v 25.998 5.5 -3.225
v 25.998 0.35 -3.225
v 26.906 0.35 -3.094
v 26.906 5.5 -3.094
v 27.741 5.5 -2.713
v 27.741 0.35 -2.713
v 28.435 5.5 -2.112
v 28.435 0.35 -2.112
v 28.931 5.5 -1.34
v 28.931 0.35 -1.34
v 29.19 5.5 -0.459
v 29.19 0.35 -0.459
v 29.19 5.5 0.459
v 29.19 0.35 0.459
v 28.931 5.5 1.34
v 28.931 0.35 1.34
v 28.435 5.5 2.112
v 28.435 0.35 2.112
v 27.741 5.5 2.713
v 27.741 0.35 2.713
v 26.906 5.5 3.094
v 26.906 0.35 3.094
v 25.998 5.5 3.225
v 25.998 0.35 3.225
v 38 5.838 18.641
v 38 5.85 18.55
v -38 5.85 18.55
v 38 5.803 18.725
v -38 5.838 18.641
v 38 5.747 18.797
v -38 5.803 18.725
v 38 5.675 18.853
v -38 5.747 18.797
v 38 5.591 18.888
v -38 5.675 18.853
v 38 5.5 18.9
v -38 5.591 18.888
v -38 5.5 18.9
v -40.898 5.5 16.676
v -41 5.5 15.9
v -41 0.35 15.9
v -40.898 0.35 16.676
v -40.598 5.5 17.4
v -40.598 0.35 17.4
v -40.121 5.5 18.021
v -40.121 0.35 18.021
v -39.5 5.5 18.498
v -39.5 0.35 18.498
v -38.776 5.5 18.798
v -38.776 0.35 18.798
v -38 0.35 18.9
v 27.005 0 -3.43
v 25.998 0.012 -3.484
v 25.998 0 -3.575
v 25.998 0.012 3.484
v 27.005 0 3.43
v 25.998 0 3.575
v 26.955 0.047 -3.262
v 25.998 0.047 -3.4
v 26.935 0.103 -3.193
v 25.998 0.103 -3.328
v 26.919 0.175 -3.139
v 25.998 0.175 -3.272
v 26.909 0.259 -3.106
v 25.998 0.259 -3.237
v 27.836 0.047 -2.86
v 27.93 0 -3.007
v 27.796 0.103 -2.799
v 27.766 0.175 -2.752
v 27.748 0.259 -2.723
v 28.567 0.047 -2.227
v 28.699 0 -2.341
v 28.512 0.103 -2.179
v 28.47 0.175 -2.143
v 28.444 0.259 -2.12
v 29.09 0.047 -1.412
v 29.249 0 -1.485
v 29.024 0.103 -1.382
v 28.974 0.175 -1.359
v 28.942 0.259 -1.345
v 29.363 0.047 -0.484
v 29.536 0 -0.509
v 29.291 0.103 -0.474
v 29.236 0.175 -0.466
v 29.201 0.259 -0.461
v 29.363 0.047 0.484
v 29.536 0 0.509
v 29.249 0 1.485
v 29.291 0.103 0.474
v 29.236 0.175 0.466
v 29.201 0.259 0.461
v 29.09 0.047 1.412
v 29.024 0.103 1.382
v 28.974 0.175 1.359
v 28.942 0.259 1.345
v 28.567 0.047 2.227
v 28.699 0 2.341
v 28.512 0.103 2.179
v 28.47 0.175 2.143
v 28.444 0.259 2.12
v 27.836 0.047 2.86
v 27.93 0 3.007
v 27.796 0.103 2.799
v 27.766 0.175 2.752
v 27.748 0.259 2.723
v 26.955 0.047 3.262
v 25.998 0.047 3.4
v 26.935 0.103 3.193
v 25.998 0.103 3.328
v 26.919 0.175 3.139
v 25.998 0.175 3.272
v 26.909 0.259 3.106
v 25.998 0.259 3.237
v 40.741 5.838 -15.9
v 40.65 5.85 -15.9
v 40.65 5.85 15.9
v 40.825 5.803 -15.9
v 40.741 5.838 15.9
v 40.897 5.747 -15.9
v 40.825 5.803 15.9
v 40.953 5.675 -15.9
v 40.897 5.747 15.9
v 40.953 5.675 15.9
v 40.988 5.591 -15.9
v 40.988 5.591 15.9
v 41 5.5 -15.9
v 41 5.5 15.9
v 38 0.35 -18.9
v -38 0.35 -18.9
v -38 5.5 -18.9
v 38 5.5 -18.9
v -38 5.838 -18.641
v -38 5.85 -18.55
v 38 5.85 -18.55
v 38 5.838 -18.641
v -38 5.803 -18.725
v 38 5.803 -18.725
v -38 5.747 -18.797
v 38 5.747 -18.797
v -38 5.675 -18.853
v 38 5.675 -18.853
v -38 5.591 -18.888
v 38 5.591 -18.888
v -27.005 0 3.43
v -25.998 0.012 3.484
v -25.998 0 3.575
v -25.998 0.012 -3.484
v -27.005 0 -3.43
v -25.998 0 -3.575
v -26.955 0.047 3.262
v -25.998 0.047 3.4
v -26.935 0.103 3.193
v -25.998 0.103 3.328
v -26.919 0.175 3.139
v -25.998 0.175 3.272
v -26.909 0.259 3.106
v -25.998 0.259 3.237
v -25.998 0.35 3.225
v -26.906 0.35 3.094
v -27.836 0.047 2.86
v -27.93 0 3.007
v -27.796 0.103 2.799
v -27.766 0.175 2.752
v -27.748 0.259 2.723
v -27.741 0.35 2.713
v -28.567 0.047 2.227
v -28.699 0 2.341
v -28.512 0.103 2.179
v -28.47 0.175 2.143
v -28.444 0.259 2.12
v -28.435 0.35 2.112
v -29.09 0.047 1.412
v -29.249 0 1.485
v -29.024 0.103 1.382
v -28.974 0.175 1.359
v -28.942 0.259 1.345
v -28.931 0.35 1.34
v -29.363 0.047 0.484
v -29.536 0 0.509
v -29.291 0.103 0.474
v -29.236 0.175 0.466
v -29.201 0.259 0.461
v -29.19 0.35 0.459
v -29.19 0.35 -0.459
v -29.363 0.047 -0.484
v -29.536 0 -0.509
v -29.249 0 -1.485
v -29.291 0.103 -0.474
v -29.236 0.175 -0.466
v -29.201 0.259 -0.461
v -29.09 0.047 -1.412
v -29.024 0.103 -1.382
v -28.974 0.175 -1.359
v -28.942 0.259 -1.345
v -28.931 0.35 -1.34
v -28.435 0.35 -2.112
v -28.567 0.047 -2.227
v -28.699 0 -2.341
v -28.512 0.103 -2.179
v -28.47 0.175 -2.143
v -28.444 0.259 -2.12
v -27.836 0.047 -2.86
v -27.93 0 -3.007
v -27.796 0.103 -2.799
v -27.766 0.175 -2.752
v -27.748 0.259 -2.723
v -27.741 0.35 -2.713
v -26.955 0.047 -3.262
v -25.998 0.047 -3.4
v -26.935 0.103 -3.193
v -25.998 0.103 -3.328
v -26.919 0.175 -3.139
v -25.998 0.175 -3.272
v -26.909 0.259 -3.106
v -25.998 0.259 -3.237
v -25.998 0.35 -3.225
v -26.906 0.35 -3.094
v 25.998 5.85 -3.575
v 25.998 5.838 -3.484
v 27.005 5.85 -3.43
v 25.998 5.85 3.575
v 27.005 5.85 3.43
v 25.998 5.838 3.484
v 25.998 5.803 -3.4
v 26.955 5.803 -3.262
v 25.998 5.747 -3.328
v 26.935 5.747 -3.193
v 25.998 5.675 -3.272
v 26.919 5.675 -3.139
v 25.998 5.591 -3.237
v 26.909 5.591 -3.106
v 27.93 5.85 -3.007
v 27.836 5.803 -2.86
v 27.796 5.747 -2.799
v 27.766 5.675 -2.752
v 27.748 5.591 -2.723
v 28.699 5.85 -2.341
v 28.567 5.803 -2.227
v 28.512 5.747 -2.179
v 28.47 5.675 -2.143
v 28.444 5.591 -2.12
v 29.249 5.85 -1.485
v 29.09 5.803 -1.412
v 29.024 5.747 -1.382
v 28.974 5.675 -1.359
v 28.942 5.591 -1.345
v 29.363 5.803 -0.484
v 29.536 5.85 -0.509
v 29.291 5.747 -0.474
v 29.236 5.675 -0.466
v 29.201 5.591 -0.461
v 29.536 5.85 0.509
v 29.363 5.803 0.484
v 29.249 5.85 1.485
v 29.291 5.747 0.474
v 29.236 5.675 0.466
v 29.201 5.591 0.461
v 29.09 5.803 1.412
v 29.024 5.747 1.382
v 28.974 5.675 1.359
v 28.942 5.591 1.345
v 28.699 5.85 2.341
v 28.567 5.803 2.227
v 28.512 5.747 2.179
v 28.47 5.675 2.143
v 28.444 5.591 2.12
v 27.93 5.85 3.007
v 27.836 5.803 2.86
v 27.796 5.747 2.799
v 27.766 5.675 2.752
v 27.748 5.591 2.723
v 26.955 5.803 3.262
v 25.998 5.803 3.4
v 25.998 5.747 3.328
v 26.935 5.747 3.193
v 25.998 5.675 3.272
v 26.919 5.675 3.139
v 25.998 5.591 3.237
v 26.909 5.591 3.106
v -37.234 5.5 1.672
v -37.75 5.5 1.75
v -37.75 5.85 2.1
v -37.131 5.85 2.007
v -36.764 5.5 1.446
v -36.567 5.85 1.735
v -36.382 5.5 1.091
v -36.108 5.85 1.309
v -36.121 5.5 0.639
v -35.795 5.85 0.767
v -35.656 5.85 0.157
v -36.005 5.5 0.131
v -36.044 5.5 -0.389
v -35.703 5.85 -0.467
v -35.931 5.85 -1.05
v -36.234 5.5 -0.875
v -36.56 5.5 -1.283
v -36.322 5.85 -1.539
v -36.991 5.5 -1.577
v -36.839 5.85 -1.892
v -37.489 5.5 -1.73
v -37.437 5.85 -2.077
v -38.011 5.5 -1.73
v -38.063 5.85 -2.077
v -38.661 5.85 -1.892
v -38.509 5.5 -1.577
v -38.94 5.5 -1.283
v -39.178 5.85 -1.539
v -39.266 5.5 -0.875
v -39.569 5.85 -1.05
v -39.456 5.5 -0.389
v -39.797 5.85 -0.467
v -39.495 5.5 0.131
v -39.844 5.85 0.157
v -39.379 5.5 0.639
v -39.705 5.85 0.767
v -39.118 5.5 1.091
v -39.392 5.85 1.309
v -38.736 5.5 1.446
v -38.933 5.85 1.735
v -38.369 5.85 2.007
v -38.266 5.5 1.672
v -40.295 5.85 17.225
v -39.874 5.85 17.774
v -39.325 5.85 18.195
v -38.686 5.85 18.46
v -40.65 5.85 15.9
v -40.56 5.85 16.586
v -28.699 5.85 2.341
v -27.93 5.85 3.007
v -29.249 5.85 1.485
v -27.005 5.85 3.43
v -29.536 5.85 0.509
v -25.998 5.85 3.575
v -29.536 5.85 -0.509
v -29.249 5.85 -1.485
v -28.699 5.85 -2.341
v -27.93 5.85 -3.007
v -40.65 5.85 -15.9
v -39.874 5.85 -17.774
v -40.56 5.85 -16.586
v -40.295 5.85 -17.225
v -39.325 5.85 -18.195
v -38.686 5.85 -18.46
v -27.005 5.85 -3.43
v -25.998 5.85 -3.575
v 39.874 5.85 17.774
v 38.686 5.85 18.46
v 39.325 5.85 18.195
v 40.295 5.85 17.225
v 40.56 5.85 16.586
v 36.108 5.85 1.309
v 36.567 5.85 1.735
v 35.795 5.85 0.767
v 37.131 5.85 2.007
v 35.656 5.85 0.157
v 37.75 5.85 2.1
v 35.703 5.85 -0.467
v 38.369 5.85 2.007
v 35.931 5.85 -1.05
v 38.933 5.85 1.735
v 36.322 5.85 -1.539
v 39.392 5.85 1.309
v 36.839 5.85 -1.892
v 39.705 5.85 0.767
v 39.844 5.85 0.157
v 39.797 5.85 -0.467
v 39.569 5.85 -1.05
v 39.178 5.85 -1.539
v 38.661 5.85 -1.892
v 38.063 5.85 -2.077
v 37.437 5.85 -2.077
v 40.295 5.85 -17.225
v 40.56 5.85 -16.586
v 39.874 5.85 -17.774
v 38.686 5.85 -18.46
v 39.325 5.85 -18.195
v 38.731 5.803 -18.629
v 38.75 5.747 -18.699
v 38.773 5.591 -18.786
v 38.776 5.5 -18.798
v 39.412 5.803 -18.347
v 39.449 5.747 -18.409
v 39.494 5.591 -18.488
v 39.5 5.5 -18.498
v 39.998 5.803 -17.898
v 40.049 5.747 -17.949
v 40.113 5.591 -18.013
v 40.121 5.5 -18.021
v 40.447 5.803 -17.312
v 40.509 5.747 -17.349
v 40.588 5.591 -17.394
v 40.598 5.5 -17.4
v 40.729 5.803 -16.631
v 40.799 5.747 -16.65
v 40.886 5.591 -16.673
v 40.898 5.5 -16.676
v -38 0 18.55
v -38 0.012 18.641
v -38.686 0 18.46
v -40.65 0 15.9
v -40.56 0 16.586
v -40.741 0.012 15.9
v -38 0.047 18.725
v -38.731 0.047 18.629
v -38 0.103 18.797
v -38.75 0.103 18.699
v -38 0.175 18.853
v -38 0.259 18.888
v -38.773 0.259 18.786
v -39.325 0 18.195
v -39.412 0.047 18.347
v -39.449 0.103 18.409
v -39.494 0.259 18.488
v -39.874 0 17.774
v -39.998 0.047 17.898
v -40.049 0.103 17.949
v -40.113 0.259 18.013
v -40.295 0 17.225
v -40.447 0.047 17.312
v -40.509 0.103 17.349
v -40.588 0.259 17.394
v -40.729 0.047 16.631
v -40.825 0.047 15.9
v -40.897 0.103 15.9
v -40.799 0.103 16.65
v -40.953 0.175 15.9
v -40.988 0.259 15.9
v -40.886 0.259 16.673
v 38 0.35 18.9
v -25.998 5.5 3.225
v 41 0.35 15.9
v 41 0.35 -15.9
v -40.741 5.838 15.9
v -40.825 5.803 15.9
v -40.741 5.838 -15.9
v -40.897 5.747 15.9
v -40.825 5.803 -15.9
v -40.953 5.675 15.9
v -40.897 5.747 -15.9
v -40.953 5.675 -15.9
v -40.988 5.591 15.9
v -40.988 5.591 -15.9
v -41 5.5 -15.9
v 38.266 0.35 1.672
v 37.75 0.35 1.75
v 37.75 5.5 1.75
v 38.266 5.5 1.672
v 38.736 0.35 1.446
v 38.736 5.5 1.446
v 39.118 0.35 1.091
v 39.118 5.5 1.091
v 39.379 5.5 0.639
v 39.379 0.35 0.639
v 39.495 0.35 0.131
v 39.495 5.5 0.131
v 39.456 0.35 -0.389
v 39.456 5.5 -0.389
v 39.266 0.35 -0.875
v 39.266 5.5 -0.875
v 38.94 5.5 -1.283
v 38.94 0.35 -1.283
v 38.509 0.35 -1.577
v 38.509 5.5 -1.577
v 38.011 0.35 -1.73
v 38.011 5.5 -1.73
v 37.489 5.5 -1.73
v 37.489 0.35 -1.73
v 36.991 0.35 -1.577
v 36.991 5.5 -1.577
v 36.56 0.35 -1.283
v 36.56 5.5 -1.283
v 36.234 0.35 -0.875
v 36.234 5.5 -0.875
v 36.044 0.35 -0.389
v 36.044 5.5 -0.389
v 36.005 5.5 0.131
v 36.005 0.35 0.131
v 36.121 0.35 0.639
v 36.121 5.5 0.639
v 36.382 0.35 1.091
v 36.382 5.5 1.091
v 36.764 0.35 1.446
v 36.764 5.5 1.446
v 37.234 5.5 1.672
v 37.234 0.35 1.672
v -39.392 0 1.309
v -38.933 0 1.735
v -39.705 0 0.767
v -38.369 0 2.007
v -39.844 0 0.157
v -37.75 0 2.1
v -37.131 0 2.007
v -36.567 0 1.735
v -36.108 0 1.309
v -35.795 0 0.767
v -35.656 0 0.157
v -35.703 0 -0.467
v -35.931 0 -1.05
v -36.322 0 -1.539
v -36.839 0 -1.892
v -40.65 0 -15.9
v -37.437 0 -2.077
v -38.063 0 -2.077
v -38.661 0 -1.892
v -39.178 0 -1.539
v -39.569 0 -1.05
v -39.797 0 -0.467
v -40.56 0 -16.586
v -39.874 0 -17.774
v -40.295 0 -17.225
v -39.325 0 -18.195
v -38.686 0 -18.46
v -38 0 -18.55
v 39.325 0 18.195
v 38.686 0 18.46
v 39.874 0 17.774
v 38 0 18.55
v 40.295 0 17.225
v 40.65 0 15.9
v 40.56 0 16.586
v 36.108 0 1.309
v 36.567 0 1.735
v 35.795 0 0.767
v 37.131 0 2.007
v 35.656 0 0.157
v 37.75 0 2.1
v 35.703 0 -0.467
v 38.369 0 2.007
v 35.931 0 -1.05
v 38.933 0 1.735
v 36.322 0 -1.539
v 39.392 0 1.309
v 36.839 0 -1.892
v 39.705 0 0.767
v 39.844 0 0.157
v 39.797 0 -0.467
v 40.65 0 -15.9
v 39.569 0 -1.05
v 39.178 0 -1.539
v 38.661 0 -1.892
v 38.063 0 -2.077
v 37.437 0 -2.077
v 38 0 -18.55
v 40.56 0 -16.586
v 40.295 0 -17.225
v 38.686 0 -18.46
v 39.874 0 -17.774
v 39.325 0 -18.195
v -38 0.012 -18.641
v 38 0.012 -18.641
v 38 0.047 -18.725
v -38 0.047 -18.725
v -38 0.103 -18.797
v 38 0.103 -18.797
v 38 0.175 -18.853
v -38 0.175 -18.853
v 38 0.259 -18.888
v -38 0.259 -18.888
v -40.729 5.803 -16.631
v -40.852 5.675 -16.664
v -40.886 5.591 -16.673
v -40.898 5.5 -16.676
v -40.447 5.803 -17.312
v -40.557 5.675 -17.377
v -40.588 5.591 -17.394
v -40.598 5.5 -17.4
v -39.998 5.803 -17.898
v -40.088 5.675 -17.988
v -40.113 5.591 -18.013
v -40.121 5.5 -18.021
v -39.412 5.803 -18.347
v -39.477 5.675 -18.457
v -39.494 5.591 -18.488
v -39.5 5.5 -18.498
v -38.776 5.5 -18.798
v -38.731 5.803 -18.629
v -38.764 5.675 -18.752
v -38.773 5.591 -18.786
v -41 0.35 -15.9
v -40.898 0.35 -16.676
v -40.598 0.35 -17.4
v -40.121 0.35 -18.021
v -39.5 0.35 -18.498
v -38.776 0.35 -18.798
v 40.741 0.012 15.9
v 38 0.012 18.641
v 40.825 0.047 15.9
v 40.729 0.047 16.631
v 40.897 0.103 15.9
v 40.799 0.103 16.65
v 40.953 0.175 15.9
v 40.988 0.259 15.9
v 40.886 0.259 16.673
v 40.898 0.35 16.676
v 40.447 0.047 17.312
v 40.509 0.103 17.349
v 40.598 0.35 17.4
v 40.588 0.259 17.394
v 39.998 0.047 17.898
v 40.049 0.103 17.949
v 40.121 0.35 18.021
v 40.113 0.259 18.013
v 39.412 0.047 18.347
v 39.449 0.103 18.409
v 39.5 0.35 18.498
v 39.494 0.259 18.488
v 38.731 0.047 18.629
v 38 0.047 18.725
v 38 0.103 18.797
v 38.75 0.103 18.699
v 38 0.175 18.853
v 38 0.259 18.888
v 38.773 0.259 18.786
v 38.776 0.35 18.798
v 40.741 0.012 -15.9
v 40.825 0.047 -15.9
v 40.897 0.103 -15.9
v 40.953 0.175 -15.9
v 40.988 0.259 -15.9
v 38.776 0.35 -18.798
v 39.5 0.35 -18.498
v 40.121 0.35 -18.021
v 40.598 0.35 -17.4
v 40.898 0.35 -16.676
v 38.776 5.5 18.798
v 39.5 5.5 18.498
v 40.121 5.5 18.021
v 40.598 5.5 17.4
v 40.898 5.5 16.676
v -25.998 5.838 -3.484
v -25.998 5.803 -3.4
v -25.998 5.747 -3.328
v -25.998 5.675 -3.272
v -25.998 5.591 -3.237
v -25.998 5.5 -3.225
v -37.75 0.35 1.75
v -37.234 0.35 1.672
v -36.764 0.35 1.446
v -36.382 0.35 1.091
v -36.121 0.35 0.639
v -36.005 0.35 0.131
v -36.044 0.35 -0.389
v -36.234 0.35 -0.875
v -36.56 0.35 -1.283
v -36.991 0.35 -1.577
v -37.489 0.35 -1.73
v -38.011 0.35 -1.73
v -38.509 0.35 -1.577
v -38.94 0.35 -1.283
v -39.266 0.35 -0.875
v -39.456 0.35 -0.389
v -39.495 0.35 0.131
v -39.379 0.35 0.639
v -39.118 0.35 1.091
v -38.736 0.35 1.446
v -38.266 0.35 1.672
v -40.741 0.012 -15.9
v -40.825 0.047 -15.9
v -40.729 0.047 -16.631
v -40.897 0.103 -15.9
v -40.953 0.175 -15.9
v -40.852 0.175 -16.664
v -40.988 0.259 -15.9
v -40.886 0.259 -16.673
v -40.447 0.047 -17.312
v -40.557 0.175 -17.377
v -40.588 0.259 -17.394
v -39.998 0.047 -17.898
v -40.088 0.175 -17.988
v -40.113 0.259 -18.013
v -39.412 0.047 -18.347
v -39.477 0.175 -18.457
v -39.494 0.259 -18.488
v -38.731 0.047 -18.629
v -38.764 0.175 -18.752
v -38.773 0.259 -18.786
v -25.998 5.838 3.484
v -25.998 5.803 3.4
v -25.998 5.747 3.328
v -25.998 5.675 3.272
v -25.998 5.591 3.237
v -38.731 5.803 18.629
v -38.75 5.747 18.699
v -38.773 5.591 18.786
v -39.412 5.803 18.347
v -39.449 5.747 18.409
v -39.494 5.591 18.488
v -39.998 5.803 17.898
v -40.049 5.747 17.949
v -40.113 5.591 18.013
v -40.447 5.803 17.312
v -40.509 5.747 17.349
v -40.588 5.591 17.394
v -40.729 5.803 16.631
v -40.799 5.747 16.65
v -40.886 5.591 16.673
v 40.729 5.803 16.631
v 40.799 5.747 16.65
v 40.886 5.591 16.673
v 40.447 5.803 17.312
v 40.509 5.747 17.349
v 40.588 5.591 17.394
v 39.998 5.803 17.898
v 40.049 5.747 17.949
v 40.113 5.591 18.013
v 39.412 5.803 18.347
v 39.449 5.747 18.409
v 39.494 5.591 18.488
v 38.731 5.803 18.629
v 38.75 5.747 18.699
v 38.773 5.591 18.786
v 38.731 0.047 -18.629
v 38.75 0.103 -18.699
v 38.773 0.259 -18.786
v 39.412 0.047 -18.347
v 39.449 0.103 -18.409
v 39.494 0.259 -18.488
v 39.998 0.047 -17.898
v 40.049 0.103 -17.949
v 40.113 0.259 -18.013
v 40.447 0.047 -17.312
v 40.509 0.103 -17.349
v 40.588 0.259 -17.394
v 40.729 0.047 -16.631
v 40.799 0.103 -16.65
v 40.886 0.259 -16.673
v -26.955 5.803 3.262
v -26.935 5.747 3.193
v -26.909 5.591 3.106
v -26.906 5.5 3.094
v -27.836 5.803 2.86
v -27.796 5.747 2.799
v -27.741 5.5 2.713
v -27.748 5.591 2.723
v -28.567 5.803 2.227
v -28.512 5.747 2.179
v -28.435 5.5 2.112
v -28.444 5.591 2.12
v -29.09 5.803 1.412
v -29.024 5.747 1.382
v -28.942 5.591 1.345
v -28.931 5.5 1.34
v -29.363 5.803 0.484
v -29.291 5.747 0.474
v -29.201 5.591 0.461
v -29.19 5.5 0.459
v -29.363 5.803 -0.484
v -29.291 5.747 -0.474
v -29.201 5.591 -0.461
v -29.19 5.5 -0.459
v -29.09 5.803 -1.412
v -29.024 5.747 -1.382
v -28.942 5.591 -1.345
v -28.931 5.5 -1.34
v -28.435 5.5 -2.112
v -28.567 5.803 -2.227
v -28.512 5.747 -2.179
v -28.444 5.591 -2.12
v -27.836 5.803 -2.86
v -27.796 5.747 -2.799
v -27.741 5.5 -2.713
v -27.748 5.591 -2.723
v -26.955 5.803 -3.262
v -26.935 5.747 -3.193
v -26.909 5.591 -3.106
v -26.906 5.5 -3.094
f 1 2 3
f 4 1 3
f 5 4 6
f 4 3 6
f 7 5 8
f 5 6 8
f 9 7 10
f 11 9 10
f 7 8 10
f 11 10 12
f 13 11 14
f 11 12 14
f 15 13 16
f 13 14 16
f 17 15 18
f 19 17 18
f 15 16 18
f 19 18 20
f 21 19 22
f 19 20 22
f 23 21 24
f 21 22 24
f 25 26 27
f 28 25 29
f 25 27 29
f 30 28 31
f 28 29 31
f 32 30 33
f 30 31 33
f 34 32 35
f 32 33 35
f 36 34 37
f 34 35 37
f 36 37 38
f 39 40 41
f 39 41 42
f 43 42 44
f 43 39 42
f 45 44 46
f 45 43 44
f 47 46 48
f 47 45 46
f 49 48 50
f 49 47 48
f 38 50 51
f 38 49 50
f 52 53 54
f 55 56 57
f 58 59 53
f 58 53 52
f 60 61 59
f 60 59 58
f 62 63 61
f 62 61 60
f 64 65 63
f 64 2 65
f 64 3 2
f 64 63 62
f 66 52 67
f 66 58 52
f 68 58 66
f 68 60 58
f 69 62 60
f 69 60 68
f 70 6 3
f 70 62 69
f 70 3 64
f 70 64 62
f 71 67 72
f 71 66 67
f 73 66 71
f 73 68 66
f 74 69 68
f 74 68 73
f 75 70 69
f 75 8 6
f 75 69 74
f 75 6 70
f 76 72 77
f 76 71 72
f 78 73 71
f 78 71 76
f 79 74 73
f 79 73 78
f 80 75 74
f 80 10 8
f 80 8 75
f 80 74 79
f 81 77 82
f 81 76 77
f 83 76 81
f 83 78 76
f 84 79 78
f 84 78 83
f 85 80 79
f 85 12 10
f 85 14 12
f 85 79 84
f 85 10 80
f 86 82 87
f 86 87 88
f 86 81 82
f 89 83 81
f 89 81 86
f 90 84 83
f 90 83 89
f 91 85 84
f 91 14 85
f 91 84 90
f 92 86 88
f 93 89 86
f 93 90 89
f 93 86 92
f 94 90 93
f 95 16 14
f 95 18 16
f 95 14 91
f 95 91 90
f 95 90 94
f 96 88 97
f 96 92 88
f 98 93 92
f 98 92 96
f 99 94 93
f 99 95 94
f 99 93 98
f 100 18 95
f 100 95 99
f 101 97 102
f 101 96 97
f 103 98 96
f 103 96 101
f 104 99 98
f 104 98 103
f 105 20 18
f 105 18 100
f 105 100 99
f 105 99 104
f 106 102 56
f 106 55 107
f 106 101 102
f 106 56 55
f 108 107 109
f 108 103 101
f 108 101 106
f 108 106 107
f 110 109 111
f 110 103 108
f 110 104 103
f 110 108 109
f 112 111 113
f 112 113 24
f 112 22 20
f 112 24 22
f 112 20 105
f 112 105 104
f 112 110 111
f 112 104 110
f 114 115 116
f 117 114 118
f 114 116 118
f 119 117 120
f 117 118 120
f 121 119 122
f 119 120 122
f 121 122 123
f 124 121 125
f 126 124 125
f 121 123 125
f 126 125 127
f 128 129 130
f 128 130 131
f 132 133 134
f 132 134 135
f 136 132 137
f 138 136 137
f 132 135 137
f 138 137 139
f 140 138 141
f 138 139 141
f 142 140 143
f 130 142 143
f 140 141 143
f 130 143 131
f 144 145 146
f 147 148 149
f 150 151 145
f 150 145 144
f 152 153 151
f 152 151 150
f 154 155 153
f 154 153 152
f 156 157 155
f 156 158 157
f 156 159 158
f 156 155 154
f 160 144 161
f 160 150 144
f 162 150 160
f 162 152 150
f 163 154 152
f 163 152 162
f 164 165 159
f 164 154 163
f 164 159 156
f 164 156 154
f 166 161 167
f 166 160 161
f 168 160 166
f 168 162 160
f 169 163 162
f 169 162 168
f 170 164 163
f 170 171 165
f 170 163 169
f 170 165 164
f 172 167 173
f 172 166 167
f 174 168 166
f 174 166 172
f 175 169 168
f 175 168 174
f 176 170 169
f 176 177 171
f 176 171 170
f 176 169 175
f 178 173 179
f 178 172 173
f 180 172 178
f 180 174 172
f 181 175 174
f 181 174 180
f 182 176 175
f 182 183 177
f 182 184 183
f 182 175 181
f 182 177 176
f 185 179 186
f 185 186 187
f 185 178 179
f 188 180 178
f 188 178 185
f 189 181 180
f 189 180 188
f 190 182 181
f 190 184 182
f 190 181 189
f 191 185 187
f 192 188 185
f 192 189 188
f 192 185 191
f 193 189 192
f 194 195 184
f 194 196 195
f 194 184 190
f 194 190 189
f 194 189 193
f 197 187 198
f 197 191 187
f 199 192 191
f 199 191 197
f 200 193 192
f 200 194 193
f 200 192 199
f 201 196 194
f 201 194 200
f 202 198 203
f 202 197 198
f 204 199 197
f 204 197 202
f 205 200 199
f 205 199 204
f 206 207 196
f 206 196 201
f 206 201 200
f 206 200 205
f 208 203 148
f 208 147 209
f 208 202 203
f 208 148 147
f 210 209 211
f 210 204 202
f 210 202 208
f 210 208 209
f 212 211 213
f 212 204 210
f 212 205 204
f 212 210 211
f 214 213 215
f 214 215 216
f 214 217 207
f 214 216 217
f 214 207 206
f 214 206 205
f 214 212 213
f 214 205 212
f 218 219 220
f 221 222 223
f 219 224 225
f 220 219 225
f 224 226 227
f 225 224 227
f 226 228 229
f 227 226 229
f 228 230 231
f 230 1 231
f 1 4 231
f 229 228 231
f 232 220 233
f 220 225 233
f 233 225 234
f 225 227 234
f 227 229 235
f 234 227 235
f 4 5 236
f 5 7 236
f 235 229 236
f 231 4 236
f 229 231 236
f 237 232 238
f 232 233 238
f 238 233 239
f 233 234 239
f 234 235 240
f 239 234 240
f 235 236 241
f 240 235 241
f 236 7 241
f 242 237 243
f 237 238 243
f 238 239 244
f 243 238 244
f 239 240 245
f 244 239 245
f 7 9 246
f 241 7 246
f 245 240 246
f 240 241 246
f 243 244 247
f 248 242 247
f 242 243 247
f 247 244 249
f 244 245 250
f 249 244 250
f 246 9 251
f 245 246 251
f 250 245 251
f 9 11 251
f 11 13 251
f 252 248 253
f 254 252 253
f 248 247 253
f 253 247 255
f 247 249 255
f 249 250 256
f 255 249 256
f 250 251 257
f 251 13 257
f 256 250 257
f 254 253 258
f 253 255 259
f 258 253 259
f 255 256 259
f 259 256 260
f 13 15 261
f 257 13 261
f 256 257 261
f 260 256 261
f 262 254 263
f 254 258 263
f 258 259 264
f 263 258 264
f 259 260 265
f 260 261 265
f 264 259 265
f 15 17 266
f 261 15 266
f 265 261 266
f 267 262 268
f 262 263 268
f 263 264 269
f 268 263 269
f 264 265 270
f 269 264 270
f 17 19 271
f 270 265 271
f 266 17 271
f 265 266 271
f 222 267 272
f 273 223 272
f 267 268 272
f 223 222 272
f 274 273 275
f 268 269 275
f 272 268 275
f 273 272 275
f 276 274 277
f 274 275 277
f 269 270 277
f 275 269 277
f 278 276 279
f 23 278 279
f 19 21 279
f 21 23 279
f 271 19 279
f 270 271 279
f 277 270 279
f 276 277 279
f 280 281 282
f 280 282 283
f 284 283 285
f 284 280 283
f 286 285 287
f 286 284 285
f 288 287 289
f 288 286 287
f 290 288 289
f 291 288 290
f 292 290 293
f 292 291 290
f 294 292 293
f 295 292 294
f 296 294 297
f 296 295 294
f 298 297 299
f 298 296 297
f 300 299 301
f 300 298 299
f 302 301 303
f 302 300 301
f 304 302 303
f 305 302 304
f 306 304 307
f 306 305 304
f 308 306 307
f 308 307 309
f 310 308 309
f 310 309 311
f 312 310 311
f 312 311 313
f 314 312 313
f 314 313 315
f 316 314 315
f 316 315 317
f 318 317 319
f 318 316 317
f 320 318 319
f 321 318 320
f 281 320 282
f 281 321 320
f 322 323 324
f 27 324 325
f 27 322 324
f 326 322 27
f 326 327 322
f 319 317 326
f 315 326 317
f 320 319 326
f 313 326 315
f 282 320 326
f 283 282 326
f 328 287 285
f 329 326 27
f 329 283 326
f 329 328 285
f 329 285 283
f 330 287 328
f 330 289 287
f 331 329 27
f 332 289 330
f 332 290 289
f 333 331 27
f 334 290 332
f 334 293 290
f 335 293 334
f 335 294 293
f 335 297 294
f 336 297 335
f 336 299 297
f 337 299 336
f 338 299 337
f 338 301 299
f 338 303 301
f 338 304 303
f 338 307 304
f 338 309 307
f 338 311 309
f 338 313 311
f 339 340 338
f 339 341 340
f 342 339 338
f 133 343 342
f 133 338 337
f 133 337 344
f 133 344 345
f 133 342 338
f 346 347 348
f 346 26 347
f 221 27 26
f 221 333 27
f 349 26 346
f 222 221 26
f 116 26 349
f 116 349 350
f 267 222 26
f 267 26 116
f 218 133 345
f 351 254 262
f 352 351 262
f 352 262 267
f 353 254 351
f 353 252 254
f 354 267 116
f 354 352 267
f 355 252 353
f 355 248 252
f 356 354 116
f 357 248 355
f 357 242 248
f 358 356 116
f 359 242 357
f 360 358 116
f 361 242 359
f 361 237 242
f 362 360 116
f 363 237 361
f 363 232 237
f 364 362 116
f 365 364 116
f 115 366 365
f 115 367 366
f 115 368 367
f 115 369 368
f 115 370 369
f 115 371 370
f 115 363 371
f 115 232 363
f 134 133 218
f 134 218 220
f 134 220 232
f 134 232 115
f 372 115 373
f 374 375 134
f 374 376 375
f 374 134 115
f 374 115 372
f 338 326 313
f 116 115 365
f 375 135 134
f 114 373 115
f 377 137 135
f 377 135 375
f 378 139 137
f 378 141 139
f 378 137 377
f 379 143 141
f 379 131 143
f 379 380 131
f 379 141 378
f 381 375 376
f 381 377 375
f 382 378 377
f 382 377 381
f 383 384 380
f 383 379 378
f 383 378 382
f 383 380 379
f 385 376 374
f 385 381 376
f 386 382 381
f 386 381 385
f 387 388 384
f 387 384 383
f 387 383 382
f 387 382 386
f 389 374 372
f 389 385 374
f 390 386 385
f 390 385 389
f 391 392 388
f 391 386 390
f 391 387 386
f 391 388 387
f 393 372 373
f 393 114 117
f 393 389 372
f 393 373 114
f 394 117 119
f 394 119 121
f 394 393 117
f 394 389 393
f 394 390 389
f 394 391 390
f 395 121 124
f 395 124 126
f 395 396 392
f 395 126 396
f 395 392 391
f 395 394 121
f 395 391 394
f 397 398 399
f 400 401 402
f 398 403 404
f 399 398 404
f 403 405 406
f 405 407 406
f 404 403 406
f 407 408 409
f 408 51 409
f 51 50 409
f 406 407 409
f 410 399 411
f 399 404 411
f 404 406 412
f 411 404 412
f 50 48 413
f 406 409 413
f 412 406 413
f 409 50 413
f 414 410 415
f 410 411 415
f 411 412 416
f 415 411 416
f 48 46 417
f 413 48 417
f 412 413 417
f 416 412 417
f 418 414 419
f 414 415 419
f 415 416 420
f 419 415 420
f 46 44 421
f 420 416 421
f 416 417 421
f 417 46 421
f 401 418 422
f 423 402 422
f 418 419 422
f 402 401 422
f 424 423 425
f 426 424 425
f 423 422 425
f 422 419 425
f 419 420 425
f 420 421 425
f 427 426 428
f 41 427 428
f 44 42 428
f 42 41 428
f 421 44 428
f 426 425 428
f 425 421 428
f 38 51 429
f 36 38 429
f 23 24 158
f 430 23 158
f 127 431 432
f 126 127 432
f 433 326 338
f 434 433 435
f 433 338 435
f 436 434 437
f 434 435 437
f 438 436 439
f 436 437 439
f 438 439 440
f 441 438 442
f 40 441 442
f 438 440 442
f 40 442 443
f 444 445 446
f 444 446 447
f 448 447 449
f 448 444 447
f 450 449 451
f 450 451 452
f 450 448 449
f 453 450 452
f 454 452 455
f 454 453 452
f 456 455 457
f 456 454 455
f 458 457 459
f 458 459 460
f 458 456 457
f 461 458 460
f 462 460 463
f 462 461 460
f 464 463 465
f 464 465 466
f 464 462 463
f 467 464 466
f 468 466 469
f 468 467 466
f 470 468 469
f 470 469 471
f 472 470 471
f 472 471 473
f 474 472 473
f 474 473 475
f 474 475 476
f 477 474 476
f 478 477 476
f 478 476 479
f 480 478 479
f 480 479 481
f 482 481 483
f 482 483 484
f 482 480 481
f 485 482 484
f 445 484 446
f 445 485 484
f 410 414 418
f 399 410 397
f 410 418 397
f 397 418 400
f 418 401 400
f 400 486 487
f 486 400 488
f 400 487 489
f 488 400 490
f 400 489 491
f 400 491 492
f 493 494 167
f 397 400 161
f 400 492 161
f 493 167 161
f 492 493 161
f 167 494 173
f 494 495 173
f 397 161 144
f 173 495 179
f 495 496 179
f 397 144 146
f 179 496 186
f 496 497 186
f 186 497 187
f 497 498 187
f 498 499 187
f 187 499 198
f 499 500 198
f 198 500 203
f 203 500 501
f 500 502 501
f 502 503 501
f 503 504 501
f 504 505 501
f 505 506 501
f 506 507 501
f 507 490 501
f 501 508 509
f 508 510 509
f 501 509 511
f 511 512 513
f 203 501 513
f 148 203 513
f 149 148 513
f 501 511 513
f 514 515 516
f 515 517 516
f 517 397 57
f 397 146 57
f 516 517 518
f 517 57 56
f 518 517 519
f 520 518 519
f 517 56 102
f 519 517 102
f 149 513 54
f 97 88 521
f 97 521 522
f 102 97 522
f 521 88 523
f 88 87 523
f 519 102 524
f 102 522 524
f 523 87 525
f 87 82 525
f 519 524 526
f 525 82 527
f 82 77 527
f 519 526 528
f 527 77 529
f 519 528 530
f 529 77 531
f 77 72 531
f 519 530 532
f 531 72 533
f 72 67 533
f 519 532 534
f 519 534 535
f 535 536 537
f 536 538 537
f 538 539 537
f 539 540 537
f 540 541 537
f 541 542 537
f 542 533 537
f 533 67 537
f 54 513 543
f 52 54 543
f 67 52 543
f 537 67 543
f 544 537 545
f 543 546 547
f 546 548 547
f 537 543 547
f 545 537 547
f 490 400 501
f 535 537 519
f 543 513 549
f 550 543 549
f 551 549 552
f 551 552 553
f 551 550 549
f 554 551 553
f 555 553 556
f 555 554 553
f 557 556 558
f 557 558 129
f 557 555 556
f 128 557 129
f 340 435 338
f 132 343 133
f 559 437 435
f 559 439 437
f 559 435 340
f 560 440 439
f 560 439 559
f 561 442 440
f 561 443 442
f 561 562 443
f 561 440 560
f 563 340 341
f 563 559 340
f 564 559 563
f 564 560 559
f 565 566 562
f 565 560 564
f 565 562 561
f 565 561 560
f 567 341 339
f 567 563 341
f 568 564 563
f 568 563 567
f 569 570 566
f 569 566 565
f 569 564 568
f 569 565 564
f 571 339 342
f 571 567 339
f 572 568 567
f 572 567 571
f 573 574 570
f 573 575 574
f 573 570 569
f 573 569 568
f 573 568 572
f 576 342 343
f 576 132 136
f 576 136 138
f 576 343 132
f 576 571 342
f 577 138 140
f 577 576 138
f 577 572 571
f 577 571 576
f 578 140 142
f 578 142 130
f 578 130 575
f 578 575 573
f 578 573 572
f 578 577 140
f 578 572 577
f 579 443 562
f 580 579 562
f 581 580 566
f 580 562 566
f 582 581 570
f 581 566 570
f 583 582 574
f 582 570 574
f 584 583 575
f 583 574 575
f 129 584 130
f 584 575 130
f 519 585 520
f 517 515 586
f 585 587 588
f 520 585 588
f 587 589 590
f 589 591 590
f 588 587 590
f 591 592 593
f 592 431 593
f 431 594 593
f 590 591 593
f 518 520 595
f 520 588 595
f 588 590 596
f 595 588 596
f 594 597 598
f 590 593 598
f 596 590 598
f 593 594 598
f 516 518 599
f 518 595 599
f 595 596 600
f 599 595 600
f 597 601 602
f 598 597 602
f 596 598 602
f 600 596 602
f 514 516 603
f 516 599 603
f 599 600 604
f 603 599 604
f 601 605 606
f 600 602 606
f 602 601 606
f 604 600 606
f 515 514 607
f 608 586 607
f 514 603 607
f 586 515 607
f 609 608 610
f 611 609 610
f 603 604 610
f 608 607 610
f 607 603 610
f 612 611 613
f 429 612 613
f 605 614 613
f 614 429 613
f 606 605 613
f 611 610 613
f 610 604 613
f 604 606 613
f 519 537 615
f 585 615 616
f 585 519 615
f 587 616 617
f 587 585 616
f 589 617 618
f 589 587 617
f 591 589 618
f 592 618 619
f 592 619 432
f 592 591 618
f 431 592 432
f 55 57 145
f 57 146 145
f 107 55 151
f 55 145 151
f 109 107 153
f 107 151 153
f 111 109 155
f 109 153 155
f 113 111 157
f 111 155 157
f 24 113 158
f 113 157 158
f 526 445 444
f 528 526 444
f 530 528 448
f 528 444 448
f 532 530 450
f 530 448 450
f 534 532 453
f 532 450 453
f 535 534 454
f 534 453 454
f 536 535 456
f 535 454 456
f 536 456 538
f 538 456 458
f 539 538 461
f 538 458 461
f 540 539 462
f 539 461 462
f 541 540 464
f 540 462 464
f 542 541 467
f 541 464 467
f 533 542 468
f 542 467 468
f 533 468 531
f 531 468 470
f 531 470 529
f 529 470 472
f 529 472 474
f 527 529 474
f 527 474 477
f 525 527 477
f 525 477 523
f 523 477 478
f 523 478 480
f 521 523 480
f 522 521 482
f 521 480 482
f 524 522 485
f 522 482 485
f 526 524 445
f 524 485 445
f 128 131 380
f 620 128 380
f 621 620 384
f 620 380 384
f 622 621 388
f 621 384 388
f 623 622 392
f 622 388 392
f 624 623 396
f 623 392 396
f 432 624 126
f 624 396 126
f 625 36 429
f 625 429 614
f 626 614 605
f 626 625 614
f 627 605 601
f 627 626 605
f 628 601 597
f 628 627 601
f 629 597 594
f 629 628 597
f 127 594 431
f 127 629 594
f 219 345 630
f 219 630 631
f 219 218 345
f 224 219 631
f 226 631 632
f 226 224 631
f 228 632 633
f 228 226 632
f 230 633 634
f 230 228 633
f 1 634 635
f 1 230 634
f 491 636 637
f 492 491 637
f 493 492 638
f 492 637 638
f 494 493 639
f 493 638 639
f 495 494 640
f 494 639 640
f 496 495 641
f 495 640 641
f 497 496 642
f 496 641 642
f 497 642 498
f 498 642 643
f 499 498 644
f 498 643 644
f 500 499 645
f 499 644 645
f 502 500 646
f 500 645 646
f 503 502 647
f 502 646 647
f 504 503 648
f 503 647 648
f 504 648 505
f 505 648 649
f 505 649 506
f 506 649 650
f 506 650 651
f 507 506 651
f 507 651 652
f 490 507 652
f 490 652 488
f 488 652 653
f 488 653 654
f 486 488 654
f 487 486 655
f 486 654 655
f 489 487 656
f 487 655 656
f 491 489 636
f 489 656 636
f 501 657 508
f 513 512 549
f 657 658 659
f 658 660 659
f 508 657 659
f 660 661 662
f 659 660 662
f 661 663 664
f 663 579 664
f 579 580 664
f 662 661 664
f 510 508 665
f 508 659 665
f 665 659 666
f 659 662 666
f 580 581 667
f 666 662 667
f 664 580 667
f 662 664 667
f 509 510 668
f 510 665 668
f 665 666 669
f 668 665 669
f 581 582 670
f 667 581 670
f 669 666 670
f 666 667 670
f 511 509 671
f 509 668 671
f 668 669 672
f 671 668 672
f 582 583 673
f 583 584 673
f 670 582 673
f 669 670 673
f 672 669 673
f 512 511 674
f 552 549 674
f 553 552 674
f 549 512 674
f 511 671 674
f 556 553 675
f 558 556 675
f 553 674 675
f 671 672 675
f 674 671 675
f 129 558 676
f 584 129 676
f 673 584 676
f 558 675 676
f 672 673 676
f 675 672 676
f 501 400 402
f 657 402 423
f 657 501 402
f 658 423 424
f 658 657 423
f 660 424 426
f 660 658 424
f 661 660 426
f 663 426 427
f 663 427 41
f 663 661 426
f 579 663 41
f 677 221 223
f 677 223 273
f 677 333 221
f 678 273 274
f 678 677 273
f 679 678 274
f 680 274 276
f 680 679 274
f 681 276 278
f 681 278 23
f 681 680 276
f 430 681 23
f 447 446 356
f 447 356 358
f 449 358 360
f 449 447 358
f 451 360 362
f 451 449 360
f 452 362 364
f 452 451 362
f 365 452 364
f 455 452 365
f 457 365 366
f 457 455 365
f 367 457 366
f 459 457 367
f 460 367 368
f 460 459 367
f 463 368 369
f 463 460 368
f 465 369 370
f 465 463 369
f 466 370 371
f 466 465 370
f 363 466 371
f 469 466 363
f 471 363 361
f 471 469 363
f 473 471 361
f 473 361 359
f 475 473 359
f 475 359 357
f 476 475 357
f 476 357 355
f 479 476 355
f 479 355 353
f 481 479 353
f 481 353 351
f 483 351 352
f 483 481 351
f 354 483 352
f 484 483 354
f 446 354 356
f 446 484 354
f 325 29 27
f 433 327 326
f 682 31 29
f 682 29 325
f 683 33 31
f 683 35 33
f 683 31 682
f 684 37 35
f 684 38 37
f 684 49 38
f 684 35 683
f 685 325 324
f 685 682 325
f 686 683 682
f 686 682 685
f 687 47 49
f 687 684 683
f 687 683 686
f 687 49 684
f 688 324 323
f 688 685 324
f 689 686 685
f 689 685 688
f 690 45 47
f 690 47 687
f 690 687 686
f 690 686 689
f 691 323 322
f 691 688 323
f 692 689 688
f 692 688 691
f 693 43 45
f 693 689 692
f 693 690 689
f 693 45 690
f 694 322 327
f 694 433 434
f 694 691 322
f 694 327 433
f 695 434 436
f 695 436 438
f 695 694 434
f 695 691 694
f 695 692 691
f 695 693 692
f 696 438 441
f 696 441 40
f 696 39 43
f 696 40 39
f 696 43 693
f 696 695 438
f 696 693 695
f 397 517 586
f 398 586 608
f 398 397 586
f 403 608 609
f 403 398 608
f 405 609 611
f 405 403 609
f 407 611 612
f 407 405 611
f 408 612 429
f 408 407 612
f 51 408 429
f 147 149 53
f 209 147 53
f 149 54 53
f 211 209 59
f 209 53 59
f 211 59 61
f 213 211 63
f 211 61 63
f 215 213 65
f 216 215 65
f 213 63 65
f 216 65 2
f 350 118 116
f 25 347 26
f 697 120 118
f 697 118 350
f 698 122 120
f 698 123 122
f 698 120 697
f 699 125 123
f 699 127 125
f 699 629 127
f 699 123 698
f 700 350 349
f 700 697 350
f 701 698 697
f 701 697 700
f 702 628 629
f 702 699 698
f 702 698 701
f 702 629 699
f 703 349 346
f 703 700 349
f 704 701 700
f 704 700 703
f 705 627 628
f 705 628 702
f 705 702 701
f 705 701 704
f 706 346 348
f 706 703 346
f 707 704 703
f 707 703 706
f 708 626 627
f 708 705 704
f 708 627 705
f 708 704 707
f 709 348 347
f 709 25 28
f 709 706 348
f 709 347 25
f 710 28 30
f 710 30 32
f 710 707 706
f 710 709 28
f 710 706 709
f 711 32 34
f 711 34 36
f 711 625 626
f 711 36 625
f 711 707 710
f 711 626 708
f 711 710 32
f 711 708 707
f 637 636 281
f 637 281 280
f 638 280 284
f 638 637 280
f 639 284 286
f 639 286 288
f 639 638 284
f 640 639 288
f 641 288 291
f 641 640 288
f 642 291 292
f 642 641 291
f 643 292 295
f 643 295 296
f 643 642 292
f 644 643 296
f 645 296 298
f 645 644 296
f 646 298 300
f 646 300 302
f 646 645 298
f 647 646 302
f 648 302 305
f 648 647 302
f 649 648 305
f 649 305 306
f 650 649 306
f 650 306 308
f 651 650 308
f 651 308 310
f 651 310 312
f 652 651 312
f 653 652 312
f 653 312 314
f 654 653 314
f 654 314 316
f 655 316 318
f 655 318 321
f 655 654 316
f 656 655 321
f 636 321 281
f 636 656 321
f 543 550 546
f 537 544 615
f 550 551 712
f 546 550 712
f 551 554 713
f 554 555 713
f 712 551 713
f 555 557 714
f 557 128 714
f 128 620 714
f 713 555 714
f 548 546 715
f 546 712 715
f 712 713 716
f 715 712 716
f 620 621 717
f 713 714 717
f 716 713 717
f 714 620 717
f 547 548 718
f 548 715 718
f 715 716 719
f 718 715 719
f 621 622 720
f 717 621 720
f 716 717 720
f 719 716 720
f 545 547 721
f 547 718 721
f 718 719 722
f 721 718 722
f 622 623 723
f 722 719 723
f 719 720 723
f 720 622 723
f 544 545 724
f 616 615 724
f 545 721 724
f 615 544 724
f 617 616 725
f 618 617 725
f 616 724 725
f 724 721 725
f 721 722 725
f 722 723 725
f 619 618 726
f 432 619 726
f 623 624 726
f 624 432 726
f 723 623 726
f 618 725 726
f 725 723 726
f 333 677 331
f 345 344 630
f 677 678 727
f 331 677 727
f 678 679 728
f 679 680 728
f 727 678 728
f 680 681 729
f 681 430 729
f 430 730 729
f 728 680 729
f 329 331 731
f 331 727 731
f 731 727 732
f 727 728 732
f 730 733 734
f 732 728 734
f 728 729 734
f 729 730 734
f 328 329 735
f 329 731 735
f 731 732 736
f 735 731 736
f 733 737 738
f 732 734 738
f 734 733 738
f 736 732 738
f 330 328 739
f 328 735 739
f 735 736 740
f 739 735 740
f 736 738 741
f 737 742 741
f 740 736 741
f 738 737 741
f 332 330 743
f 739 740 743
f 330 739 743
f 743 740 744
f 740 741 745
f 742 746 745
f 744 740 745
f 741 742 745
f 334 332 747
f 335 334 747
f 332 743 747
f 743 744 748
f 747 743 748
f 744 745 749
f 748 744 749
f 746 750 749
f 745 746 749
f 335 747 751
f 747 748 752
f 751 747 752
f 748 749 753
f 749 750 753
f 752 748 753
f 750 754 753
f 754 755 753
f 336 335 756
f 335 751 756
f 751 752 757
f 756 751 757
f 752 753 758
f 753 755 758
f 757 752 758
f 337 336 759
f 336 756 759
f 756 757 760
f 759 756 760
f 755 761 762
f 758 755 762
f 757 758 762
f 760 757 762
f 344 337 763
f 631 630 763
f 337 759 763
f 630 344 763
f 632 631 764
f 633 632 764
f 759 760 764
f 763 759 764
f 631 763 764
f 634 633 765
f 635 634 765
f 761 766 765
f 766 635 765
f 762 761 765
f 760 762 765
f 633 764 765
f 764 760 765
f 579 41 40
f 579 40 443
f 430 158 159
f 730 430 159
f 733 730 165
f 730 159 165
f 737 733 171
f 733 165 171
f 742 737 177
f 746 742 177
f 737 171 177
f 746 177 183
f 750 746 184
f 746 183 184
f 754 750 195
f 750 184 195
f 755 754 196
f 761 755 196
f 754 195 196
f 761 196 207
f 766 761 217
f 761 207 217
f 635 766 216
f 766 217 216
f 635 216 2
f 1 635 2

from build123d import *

# Parameters (mm, degrees)
SKETCH1_W           = 82
SKETCH1_H           = 37.8
SKETCH1_R           = 1.75
BOSS_EXTRUDE1_DEPTH = 5.85
FILLET2_R           = 3
FILLET3_R           = 0.35
CHAMFER1_SIZE       = 0.35


with BuildPart() as part:
    # Sketch1 → Boss-Extrude1 (new body)
    with BuildSketch(Plane(origin=(0, 0, 0), x_dir=(1, 0, 0), z_dir=(0, 1, 0))):
        Rectangle(SKETCH1_W, SKETCH1_H)
        with Locations(Location((37.75, 0, 0), (0, 0, 270))):
            Circle(SKETCH1_R, mode=Mode.SUBTRACT)
        with Locations(Location((-37.75, 0, 0), (0, 0, 270))):
            Circle(SKETCH1_R, mode=Mode.SUBTRACT)
        with BuildLine():
            Line((-25.9975, 3.225), (-13.623486154, 3.225))
            Line((-13.623486154, 3.225), (13.623486154, 3.225))
            Line((13.623486154, 3.225), (25.9975, 3.225))
            ThreePointArc((25.9975, 3.225), (29.2225, 0), (25.9975, -3.225))
            Line((25.9975, -3.225), (13.623486154, -3.225))
            Line((13.623486154, -3.225), (-13.623486154, -3.225))
            Line((-13.623486154, -3.225), (-25.9975, -3.225))
            ThreePointArc((-25.9975, -3.225), (-29.2225, 0), (-25.9975, 3.225))
        make_face(mode=Mode.SUBTRACT)
    extrude(amount=BOSS_EXTRUDE1_DEPTH)

    # Fillet2
    fillet2_edges = [part.edges().sort_by_distance(p)[0] for p in [
        (-41, 2.925, -18.9),
        (41, 2.925, -18.9),
        (41, 2.925, 18.9),
        (-41, 2.925, 18.9),
    ]]
    fillet(fillet2_edges, radius=FILLET2_R)

    # Fillet3
    fillet3_edges = [part.edges().sort_by_distance(p)[0] for p in [
        (-29.2225, 0, 0),
        (0, 0, 3.225),
        (29.2225, 0, 0),
        (0, 0, -3.225),
        (0, 5.85, -3.225),
        (-29.2225, 5.85, 0),
        (0, 5.85, 3.225),
        (29.2225, 5.85, 0),
        (0, 0, -18.9),
        (0, 5.85, -18.9),
        (-41, 0, 0),
        (41, 0, 0),
        (0, 0, 18.9),
        (-40.121320344, 0, 18.021320344),
        (-40.121320344, 0, -18.021320344),
        (40.121320344, 0, 18.021320344),
        (40.121320344, 0, -18.021320344),
        (41, 5.85, 0),
        (-41, 5.85, 0),
        (0, 5.85, 18.9),
        (-40.121320344, 5.85, 18.021320344),
        (-40.121320344, 5.85, -18.021320344),
        (40.121320344, 5.85, 18.021320344),
        (40.121320344, 5.85, -18.021320344),
    ]]
    fillet(fillet3_edges, radius=FILLET3_R)

    # Chamfer1
    chamfer1_edges = [part.edges().sort_by_distance(p)[0] for p in [
        (37.75, 0, -1.75),
        (37.75, 5.85, -1.75),
        (-37.75, 0, -1.75),
        (-37.75, 5.85, -1.75),
    ]]
    chamfer(chamfer1_edges, length=CHAMFER1_SIZE)


solid = part.part
